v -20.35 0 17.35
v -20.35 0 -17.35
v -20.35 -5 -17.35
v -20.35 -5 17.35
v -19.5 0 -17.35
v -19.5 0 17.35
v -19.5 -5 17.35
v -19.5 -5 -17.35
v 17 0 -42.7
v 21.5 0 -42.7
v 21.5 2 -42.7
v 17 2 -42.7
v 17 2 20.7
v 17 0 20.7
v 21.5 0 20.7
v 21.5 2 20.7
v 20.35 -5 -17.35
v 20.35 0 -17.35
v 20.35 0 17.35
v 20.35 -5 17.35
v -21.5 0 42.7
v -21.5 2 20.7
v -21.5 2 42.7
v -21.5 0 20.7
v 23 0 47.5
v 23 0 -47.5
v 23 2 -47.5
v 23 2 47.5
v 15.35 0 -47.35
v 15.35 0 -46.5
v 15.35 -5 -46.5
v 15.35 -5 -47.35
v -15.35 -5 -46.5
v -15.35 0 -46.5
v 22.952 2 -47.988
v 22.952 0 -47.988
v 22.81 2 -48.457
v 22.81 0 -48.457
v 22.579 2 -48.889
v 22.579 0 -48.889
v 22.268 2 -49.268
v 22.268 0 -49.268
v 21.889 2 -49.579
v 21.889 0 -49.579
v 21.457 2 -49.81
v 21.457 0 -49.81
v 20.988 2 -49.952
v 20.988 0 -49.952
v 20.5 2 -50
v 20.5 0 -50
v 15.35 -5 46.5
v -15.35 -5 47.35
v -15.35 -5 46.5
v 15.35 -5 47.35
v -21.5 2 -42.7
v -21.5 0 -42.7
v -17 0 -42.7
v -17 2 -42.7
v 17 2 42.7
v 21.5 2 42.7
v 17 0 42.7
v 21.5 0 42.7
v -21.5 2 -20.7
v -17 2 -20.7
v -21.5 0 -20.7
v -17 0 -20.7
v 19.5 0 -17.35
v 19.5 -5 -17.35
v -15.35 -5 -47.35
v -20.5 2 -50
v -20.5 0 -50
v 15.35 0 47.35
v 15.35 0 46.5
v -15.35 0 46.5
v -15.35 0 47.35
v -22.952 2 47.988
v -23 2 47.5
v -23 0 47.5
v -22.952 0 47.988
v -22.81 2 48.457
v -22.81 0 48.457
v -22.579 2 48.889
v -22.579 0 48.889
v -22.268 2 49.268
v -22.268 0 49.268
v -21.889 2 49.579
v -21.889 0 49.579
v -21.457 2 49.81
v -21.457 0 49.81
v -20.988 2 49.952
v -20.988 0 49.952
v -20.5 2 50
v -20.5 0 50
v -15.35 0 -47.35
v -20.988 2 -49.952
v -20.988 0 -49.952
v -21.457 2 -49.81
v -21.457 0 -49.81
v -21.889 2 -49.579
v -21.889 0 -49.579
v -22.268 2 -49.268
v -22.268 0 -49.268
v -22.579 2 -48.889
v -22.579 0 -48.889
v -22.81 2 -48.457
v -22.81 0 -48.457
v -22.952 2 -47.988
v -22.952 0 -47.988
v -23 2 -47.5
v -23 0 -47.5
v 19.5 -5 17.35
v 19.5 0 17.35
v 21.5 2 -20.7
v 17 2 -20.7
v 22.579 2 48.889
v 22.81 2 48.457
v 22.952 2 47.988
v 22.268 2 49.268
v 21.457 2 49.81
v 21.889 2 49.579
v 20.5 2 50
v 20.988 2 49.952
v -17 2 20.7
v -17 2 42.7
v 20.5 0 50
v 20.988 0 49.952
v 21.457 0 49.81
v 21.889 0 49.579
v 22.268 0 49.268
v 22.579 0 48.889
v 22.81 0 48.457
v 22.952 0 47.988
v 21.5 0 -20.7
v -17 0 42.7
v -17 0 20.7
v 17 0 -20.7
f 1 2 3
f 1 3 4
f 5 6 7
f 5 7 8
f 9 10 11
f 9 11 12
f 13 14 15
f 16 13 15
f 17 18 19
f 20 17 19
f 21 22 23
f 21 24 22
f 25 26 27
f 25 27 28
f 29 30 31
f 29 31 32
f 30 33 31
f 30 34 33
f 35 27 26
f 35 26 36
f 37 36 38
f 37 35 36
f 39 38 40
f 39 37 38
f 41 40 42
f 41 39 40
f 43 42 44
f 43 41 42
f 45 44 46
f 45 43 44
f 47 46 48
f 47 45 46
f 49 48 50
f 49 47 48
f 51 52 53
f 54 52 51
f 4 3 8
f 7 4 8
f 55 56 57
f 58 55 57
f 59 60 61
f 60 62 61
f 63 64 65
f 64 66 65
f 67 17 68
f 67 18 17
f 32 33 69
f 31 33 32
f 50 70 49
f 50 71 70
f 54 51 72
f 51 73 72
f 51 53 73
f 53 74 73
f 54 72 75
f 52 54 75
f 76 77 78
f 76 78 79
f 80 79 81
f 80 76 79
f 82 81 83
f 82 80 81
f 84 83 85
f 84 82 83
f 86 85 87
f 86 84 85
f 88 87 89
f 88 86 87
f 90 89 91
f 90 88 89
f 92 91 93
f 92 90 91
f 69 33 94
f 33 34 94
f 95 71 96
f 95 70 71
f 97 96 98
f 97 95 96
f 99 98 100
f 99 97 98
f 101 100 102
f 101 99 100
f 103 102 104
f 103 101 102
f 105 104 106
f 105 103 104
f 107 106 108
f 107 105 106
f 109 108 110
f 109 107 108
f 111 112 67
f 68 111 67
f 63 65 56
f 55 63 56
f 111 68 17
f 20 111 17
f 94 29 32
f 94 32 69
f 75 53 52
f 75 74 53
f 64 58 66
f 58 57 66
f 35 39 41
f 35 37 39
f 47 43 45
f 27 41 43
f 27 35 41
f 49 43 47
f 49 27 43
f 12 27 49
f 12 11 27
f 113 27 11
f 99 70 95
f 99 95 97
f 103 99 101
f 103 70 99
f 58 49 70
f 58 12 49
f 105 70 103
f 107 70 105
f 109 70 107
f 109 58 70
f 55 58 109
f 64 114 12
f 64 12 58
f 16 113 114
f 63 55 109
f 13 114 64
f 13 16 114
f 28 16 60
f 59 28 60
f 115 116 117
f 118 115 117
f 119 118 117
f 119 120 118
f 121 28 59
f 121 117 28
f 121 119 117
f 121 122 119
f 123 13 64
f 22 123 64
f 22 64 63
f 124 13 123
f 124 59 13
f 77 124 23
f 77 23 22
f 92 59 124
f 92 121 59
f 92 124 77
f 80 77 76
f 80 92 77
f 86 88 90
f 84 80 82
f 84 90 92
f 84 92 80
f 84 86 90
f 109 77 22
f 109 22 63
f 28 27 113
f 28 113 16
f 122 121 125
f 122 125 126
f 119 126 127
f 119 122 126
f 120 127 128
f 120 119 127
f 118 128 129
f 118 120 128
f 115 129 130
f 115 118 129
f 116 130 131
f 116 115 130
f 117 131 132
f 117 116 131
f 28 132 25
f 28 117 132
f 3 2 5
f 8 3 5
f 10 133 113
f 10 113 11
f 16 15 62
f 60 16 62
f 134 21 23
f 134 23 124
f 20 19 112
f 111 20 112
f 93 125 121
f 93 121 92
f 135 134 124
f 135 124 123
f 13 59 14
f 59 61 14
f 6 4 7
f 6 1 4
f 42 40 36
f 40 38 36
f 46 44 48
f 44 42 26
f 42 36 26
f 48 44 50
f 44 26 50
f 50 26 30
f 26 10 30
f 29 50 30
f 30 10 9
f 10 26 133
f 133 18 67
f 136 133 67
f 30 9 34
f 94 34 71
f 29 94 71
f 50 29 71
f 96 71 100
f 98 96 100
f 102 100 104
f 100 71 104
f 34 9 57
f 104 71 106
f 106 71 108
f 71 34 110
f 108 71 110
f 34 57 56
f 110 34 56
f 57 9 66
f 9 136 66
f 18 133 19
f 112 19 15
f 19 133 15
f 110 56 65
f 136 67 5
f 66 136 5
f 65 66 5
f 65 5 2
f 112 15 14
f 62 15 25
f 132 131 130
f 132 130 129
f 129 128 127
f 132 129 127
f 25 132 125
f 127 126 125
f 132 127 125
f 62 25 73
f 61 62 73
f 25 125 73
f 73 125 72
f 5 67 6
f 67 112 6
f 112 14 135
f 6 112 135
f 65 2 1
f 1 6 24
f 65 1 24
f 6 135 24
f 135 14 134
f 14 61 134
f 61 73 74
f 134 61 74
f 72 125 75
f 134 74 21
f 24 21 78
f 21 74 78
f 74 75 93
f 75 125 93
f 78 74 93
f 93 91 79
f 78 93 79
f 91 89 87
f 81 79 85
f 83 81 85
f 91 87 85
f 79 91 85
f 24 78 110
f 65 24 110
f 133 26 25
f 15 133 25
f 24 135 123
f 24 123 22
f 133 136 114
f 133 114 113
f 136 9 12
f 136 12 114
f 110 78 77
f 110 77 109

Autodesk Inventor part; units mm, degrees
ref_plane "YZ Plane" through (0, 0, 0) normal (1, 0, 0) x (0, 1, 0)
ref_plane "XZ Plane" through (0, 0, 0) normal (0, 1, 0) x (-1, 0, 0)
ref_plane "XY Plane" through (0, 0, 0) normal (0, 0, 1) x (1, 0, 0)
sketch "Sketch1" plane through (0, 0, 0) normal (0, 1, 0) x (-1, 0, 0)
  line L0 (23, -50) -> (-23, -50)
  line L1 (-23, -50) -> (-23, 50)
  line L2 (-23, 50) -> (23, 50)
  line L3 (23, 50) -> (23, -50)
  line L4 (0, -70) -> (0, 70) projected
  line L5 (-32.2, 0) -> (32.2, 0) projected
  point P0 (0, 0)
  dimension "d0" = 46
  dimension "d1" = 100
extrude "Extrusion1" add sketch "Sketch1" along normal blind 2
fillet "Fillet1" radius 2.5 4 edges at (-23, 1, -50) (-23, 1, 50) (23, 1, -50) (23, 1, 50)
sketch "Sketch6" plane through (0, 0, 0) normal (0, -1, 0) x (1, 0, 0)
  line L0 (21.5, -42.7) -> (17, -42.7)
  line L1 (17, -42.7) -> (17, -20.7)
  line L2 (17, -20.7) -> (21.5, -20.7)
  line L3 (21.5, -20.7) -> (21.5, -42.7)
  line L4 (20.5, -50) -> (-20.5, -50) projected
  line L5 (23, 47.5) -> (23, -47.5) projected
  line L6 (0, 70) -> (0, -70) projected
  line L7 (-32.2, 0) -> (32.2, 0) projected
  line L8 (-21.5, -42.7) -> (-17, -42.7)
  line L9 (-17, -42.7) -> (-17, -20.7)
  line L10 (-17, -20.7) -> (-21.5, -20.7)
  line L11 (-21.5, -20.7) -> (-21.5, -42.7)
  line L12 (21.5, 42.7) -> (17, 42.7)
  line L13 (17, 42.7) -> (17, 20.7)
  line L14 (17, 20.7) -> (21.5, 20.7)
  line L15 (21.5, 20.7) -> (21.5, 42.7)
  line L16 (-21.5, 42.7) -> (-17, 42.7)
  line L17 (-17, 42.7) -> (-17, 20.7)
  line L18 (-17, 20.7) -> (-21.5, 20.7)
  line L19 (-21.5, 20.7) -> (-21.5, 42.7)
  point P0 (0, 0)
  dimension "d50" = 4.5
  dimension "d51" = 22
  dimension "d52" = 7.3
  dimension "d53" = 1.5
extrude "Extrusion6" cut sketch "Sketch6" against normal through all
sketch "Sketch7" plane through (0, 0, 0) normal (0, -1, 0) x (1, 0, 0)
  line L0 (17, -20.7) -> (21.5, -20.7) projected
  line L1 (19.5, 17.35) -> (19.5, -17.35)
  line L2 (20.35, -17.35) -> (20.35, 17.35)
  line L3 (23, 47.5) -> (23, -47.5) projected
  line L4 (0, 70) -> (0, -70) projected
  line L5 (-32.2, 0) -> (32.2, 0) projected
  line L6 (21.5, 20.7) -> (17, 20.7) projected
  line L7 (15.35, 47.35) -> (-15.35, 47.35)
  line L8 (-15.35, 46.5) -> (15.35, 46.5)
  line L9 (-20.5, 50) -> (20.5, 50) projected
  line L10 (-15.371, 47.35) -> (-15.35, 47.35)
  line L11 (20.35, 17.35) -> (19.5, 17.35)
  line L12 (20.35, -17.35) -> (19.5, -17.35)
  line L13 (15.35, 46.5) -> (15.35, 47.35)
  line L14 (17, 20.7) -> (17, 42.7) projected
  line L15 (-15.35, 46.5) -> (-15.35, 47.35)
  line L16 (-17, 42.7) -> (-17, 20.7) projected
  line L17 (15.35, -47.35) -> (-15.35, -47.35)
  line L18 (-15.35, -46.5) -> (15.35, -46.5)
  line L19 (-15.371, -47.35) -> (-15.35, -47.35)
  line L20 (15.35, -46.5) -> (15.35, -47.35)
  line L21 (-15.35, -46.5) -> (-15.35, -47.35)
  line L22 (-17, -20.7) -> (-21.5, -20.7)
  line L23 (-19.5, 17.35) -> (-19.5, -17.35)
  line L24 (-20.35, -17.35) -> (-20.35, 17.35)
  line L25 (-21.5, 20.7) -> (-17, 20.7)
  line L26 (-20.35, 17.35) -> (-19.5, 17.35)
  line L27 (-20.35, -17.35) -> (-19.5, -17.35)
  line L28 (-23, -47.5) -> (-23, 47.5) projected
  point P0 (0, 0)
  dimension "d57" = 3.5
  dimension "d65" = 3.5
  dimension "d67" = 3.35
  dimension "d68" = 0.85
  dimension "d69" = 3.35
  dimension "d70" = 0.85
  dimension "d75" = 7.65
  dimension "d76" = 7.65
extrude "Extrusion7" add sketch "Sketch7" along normal blind 5
properties part number "horni1"
